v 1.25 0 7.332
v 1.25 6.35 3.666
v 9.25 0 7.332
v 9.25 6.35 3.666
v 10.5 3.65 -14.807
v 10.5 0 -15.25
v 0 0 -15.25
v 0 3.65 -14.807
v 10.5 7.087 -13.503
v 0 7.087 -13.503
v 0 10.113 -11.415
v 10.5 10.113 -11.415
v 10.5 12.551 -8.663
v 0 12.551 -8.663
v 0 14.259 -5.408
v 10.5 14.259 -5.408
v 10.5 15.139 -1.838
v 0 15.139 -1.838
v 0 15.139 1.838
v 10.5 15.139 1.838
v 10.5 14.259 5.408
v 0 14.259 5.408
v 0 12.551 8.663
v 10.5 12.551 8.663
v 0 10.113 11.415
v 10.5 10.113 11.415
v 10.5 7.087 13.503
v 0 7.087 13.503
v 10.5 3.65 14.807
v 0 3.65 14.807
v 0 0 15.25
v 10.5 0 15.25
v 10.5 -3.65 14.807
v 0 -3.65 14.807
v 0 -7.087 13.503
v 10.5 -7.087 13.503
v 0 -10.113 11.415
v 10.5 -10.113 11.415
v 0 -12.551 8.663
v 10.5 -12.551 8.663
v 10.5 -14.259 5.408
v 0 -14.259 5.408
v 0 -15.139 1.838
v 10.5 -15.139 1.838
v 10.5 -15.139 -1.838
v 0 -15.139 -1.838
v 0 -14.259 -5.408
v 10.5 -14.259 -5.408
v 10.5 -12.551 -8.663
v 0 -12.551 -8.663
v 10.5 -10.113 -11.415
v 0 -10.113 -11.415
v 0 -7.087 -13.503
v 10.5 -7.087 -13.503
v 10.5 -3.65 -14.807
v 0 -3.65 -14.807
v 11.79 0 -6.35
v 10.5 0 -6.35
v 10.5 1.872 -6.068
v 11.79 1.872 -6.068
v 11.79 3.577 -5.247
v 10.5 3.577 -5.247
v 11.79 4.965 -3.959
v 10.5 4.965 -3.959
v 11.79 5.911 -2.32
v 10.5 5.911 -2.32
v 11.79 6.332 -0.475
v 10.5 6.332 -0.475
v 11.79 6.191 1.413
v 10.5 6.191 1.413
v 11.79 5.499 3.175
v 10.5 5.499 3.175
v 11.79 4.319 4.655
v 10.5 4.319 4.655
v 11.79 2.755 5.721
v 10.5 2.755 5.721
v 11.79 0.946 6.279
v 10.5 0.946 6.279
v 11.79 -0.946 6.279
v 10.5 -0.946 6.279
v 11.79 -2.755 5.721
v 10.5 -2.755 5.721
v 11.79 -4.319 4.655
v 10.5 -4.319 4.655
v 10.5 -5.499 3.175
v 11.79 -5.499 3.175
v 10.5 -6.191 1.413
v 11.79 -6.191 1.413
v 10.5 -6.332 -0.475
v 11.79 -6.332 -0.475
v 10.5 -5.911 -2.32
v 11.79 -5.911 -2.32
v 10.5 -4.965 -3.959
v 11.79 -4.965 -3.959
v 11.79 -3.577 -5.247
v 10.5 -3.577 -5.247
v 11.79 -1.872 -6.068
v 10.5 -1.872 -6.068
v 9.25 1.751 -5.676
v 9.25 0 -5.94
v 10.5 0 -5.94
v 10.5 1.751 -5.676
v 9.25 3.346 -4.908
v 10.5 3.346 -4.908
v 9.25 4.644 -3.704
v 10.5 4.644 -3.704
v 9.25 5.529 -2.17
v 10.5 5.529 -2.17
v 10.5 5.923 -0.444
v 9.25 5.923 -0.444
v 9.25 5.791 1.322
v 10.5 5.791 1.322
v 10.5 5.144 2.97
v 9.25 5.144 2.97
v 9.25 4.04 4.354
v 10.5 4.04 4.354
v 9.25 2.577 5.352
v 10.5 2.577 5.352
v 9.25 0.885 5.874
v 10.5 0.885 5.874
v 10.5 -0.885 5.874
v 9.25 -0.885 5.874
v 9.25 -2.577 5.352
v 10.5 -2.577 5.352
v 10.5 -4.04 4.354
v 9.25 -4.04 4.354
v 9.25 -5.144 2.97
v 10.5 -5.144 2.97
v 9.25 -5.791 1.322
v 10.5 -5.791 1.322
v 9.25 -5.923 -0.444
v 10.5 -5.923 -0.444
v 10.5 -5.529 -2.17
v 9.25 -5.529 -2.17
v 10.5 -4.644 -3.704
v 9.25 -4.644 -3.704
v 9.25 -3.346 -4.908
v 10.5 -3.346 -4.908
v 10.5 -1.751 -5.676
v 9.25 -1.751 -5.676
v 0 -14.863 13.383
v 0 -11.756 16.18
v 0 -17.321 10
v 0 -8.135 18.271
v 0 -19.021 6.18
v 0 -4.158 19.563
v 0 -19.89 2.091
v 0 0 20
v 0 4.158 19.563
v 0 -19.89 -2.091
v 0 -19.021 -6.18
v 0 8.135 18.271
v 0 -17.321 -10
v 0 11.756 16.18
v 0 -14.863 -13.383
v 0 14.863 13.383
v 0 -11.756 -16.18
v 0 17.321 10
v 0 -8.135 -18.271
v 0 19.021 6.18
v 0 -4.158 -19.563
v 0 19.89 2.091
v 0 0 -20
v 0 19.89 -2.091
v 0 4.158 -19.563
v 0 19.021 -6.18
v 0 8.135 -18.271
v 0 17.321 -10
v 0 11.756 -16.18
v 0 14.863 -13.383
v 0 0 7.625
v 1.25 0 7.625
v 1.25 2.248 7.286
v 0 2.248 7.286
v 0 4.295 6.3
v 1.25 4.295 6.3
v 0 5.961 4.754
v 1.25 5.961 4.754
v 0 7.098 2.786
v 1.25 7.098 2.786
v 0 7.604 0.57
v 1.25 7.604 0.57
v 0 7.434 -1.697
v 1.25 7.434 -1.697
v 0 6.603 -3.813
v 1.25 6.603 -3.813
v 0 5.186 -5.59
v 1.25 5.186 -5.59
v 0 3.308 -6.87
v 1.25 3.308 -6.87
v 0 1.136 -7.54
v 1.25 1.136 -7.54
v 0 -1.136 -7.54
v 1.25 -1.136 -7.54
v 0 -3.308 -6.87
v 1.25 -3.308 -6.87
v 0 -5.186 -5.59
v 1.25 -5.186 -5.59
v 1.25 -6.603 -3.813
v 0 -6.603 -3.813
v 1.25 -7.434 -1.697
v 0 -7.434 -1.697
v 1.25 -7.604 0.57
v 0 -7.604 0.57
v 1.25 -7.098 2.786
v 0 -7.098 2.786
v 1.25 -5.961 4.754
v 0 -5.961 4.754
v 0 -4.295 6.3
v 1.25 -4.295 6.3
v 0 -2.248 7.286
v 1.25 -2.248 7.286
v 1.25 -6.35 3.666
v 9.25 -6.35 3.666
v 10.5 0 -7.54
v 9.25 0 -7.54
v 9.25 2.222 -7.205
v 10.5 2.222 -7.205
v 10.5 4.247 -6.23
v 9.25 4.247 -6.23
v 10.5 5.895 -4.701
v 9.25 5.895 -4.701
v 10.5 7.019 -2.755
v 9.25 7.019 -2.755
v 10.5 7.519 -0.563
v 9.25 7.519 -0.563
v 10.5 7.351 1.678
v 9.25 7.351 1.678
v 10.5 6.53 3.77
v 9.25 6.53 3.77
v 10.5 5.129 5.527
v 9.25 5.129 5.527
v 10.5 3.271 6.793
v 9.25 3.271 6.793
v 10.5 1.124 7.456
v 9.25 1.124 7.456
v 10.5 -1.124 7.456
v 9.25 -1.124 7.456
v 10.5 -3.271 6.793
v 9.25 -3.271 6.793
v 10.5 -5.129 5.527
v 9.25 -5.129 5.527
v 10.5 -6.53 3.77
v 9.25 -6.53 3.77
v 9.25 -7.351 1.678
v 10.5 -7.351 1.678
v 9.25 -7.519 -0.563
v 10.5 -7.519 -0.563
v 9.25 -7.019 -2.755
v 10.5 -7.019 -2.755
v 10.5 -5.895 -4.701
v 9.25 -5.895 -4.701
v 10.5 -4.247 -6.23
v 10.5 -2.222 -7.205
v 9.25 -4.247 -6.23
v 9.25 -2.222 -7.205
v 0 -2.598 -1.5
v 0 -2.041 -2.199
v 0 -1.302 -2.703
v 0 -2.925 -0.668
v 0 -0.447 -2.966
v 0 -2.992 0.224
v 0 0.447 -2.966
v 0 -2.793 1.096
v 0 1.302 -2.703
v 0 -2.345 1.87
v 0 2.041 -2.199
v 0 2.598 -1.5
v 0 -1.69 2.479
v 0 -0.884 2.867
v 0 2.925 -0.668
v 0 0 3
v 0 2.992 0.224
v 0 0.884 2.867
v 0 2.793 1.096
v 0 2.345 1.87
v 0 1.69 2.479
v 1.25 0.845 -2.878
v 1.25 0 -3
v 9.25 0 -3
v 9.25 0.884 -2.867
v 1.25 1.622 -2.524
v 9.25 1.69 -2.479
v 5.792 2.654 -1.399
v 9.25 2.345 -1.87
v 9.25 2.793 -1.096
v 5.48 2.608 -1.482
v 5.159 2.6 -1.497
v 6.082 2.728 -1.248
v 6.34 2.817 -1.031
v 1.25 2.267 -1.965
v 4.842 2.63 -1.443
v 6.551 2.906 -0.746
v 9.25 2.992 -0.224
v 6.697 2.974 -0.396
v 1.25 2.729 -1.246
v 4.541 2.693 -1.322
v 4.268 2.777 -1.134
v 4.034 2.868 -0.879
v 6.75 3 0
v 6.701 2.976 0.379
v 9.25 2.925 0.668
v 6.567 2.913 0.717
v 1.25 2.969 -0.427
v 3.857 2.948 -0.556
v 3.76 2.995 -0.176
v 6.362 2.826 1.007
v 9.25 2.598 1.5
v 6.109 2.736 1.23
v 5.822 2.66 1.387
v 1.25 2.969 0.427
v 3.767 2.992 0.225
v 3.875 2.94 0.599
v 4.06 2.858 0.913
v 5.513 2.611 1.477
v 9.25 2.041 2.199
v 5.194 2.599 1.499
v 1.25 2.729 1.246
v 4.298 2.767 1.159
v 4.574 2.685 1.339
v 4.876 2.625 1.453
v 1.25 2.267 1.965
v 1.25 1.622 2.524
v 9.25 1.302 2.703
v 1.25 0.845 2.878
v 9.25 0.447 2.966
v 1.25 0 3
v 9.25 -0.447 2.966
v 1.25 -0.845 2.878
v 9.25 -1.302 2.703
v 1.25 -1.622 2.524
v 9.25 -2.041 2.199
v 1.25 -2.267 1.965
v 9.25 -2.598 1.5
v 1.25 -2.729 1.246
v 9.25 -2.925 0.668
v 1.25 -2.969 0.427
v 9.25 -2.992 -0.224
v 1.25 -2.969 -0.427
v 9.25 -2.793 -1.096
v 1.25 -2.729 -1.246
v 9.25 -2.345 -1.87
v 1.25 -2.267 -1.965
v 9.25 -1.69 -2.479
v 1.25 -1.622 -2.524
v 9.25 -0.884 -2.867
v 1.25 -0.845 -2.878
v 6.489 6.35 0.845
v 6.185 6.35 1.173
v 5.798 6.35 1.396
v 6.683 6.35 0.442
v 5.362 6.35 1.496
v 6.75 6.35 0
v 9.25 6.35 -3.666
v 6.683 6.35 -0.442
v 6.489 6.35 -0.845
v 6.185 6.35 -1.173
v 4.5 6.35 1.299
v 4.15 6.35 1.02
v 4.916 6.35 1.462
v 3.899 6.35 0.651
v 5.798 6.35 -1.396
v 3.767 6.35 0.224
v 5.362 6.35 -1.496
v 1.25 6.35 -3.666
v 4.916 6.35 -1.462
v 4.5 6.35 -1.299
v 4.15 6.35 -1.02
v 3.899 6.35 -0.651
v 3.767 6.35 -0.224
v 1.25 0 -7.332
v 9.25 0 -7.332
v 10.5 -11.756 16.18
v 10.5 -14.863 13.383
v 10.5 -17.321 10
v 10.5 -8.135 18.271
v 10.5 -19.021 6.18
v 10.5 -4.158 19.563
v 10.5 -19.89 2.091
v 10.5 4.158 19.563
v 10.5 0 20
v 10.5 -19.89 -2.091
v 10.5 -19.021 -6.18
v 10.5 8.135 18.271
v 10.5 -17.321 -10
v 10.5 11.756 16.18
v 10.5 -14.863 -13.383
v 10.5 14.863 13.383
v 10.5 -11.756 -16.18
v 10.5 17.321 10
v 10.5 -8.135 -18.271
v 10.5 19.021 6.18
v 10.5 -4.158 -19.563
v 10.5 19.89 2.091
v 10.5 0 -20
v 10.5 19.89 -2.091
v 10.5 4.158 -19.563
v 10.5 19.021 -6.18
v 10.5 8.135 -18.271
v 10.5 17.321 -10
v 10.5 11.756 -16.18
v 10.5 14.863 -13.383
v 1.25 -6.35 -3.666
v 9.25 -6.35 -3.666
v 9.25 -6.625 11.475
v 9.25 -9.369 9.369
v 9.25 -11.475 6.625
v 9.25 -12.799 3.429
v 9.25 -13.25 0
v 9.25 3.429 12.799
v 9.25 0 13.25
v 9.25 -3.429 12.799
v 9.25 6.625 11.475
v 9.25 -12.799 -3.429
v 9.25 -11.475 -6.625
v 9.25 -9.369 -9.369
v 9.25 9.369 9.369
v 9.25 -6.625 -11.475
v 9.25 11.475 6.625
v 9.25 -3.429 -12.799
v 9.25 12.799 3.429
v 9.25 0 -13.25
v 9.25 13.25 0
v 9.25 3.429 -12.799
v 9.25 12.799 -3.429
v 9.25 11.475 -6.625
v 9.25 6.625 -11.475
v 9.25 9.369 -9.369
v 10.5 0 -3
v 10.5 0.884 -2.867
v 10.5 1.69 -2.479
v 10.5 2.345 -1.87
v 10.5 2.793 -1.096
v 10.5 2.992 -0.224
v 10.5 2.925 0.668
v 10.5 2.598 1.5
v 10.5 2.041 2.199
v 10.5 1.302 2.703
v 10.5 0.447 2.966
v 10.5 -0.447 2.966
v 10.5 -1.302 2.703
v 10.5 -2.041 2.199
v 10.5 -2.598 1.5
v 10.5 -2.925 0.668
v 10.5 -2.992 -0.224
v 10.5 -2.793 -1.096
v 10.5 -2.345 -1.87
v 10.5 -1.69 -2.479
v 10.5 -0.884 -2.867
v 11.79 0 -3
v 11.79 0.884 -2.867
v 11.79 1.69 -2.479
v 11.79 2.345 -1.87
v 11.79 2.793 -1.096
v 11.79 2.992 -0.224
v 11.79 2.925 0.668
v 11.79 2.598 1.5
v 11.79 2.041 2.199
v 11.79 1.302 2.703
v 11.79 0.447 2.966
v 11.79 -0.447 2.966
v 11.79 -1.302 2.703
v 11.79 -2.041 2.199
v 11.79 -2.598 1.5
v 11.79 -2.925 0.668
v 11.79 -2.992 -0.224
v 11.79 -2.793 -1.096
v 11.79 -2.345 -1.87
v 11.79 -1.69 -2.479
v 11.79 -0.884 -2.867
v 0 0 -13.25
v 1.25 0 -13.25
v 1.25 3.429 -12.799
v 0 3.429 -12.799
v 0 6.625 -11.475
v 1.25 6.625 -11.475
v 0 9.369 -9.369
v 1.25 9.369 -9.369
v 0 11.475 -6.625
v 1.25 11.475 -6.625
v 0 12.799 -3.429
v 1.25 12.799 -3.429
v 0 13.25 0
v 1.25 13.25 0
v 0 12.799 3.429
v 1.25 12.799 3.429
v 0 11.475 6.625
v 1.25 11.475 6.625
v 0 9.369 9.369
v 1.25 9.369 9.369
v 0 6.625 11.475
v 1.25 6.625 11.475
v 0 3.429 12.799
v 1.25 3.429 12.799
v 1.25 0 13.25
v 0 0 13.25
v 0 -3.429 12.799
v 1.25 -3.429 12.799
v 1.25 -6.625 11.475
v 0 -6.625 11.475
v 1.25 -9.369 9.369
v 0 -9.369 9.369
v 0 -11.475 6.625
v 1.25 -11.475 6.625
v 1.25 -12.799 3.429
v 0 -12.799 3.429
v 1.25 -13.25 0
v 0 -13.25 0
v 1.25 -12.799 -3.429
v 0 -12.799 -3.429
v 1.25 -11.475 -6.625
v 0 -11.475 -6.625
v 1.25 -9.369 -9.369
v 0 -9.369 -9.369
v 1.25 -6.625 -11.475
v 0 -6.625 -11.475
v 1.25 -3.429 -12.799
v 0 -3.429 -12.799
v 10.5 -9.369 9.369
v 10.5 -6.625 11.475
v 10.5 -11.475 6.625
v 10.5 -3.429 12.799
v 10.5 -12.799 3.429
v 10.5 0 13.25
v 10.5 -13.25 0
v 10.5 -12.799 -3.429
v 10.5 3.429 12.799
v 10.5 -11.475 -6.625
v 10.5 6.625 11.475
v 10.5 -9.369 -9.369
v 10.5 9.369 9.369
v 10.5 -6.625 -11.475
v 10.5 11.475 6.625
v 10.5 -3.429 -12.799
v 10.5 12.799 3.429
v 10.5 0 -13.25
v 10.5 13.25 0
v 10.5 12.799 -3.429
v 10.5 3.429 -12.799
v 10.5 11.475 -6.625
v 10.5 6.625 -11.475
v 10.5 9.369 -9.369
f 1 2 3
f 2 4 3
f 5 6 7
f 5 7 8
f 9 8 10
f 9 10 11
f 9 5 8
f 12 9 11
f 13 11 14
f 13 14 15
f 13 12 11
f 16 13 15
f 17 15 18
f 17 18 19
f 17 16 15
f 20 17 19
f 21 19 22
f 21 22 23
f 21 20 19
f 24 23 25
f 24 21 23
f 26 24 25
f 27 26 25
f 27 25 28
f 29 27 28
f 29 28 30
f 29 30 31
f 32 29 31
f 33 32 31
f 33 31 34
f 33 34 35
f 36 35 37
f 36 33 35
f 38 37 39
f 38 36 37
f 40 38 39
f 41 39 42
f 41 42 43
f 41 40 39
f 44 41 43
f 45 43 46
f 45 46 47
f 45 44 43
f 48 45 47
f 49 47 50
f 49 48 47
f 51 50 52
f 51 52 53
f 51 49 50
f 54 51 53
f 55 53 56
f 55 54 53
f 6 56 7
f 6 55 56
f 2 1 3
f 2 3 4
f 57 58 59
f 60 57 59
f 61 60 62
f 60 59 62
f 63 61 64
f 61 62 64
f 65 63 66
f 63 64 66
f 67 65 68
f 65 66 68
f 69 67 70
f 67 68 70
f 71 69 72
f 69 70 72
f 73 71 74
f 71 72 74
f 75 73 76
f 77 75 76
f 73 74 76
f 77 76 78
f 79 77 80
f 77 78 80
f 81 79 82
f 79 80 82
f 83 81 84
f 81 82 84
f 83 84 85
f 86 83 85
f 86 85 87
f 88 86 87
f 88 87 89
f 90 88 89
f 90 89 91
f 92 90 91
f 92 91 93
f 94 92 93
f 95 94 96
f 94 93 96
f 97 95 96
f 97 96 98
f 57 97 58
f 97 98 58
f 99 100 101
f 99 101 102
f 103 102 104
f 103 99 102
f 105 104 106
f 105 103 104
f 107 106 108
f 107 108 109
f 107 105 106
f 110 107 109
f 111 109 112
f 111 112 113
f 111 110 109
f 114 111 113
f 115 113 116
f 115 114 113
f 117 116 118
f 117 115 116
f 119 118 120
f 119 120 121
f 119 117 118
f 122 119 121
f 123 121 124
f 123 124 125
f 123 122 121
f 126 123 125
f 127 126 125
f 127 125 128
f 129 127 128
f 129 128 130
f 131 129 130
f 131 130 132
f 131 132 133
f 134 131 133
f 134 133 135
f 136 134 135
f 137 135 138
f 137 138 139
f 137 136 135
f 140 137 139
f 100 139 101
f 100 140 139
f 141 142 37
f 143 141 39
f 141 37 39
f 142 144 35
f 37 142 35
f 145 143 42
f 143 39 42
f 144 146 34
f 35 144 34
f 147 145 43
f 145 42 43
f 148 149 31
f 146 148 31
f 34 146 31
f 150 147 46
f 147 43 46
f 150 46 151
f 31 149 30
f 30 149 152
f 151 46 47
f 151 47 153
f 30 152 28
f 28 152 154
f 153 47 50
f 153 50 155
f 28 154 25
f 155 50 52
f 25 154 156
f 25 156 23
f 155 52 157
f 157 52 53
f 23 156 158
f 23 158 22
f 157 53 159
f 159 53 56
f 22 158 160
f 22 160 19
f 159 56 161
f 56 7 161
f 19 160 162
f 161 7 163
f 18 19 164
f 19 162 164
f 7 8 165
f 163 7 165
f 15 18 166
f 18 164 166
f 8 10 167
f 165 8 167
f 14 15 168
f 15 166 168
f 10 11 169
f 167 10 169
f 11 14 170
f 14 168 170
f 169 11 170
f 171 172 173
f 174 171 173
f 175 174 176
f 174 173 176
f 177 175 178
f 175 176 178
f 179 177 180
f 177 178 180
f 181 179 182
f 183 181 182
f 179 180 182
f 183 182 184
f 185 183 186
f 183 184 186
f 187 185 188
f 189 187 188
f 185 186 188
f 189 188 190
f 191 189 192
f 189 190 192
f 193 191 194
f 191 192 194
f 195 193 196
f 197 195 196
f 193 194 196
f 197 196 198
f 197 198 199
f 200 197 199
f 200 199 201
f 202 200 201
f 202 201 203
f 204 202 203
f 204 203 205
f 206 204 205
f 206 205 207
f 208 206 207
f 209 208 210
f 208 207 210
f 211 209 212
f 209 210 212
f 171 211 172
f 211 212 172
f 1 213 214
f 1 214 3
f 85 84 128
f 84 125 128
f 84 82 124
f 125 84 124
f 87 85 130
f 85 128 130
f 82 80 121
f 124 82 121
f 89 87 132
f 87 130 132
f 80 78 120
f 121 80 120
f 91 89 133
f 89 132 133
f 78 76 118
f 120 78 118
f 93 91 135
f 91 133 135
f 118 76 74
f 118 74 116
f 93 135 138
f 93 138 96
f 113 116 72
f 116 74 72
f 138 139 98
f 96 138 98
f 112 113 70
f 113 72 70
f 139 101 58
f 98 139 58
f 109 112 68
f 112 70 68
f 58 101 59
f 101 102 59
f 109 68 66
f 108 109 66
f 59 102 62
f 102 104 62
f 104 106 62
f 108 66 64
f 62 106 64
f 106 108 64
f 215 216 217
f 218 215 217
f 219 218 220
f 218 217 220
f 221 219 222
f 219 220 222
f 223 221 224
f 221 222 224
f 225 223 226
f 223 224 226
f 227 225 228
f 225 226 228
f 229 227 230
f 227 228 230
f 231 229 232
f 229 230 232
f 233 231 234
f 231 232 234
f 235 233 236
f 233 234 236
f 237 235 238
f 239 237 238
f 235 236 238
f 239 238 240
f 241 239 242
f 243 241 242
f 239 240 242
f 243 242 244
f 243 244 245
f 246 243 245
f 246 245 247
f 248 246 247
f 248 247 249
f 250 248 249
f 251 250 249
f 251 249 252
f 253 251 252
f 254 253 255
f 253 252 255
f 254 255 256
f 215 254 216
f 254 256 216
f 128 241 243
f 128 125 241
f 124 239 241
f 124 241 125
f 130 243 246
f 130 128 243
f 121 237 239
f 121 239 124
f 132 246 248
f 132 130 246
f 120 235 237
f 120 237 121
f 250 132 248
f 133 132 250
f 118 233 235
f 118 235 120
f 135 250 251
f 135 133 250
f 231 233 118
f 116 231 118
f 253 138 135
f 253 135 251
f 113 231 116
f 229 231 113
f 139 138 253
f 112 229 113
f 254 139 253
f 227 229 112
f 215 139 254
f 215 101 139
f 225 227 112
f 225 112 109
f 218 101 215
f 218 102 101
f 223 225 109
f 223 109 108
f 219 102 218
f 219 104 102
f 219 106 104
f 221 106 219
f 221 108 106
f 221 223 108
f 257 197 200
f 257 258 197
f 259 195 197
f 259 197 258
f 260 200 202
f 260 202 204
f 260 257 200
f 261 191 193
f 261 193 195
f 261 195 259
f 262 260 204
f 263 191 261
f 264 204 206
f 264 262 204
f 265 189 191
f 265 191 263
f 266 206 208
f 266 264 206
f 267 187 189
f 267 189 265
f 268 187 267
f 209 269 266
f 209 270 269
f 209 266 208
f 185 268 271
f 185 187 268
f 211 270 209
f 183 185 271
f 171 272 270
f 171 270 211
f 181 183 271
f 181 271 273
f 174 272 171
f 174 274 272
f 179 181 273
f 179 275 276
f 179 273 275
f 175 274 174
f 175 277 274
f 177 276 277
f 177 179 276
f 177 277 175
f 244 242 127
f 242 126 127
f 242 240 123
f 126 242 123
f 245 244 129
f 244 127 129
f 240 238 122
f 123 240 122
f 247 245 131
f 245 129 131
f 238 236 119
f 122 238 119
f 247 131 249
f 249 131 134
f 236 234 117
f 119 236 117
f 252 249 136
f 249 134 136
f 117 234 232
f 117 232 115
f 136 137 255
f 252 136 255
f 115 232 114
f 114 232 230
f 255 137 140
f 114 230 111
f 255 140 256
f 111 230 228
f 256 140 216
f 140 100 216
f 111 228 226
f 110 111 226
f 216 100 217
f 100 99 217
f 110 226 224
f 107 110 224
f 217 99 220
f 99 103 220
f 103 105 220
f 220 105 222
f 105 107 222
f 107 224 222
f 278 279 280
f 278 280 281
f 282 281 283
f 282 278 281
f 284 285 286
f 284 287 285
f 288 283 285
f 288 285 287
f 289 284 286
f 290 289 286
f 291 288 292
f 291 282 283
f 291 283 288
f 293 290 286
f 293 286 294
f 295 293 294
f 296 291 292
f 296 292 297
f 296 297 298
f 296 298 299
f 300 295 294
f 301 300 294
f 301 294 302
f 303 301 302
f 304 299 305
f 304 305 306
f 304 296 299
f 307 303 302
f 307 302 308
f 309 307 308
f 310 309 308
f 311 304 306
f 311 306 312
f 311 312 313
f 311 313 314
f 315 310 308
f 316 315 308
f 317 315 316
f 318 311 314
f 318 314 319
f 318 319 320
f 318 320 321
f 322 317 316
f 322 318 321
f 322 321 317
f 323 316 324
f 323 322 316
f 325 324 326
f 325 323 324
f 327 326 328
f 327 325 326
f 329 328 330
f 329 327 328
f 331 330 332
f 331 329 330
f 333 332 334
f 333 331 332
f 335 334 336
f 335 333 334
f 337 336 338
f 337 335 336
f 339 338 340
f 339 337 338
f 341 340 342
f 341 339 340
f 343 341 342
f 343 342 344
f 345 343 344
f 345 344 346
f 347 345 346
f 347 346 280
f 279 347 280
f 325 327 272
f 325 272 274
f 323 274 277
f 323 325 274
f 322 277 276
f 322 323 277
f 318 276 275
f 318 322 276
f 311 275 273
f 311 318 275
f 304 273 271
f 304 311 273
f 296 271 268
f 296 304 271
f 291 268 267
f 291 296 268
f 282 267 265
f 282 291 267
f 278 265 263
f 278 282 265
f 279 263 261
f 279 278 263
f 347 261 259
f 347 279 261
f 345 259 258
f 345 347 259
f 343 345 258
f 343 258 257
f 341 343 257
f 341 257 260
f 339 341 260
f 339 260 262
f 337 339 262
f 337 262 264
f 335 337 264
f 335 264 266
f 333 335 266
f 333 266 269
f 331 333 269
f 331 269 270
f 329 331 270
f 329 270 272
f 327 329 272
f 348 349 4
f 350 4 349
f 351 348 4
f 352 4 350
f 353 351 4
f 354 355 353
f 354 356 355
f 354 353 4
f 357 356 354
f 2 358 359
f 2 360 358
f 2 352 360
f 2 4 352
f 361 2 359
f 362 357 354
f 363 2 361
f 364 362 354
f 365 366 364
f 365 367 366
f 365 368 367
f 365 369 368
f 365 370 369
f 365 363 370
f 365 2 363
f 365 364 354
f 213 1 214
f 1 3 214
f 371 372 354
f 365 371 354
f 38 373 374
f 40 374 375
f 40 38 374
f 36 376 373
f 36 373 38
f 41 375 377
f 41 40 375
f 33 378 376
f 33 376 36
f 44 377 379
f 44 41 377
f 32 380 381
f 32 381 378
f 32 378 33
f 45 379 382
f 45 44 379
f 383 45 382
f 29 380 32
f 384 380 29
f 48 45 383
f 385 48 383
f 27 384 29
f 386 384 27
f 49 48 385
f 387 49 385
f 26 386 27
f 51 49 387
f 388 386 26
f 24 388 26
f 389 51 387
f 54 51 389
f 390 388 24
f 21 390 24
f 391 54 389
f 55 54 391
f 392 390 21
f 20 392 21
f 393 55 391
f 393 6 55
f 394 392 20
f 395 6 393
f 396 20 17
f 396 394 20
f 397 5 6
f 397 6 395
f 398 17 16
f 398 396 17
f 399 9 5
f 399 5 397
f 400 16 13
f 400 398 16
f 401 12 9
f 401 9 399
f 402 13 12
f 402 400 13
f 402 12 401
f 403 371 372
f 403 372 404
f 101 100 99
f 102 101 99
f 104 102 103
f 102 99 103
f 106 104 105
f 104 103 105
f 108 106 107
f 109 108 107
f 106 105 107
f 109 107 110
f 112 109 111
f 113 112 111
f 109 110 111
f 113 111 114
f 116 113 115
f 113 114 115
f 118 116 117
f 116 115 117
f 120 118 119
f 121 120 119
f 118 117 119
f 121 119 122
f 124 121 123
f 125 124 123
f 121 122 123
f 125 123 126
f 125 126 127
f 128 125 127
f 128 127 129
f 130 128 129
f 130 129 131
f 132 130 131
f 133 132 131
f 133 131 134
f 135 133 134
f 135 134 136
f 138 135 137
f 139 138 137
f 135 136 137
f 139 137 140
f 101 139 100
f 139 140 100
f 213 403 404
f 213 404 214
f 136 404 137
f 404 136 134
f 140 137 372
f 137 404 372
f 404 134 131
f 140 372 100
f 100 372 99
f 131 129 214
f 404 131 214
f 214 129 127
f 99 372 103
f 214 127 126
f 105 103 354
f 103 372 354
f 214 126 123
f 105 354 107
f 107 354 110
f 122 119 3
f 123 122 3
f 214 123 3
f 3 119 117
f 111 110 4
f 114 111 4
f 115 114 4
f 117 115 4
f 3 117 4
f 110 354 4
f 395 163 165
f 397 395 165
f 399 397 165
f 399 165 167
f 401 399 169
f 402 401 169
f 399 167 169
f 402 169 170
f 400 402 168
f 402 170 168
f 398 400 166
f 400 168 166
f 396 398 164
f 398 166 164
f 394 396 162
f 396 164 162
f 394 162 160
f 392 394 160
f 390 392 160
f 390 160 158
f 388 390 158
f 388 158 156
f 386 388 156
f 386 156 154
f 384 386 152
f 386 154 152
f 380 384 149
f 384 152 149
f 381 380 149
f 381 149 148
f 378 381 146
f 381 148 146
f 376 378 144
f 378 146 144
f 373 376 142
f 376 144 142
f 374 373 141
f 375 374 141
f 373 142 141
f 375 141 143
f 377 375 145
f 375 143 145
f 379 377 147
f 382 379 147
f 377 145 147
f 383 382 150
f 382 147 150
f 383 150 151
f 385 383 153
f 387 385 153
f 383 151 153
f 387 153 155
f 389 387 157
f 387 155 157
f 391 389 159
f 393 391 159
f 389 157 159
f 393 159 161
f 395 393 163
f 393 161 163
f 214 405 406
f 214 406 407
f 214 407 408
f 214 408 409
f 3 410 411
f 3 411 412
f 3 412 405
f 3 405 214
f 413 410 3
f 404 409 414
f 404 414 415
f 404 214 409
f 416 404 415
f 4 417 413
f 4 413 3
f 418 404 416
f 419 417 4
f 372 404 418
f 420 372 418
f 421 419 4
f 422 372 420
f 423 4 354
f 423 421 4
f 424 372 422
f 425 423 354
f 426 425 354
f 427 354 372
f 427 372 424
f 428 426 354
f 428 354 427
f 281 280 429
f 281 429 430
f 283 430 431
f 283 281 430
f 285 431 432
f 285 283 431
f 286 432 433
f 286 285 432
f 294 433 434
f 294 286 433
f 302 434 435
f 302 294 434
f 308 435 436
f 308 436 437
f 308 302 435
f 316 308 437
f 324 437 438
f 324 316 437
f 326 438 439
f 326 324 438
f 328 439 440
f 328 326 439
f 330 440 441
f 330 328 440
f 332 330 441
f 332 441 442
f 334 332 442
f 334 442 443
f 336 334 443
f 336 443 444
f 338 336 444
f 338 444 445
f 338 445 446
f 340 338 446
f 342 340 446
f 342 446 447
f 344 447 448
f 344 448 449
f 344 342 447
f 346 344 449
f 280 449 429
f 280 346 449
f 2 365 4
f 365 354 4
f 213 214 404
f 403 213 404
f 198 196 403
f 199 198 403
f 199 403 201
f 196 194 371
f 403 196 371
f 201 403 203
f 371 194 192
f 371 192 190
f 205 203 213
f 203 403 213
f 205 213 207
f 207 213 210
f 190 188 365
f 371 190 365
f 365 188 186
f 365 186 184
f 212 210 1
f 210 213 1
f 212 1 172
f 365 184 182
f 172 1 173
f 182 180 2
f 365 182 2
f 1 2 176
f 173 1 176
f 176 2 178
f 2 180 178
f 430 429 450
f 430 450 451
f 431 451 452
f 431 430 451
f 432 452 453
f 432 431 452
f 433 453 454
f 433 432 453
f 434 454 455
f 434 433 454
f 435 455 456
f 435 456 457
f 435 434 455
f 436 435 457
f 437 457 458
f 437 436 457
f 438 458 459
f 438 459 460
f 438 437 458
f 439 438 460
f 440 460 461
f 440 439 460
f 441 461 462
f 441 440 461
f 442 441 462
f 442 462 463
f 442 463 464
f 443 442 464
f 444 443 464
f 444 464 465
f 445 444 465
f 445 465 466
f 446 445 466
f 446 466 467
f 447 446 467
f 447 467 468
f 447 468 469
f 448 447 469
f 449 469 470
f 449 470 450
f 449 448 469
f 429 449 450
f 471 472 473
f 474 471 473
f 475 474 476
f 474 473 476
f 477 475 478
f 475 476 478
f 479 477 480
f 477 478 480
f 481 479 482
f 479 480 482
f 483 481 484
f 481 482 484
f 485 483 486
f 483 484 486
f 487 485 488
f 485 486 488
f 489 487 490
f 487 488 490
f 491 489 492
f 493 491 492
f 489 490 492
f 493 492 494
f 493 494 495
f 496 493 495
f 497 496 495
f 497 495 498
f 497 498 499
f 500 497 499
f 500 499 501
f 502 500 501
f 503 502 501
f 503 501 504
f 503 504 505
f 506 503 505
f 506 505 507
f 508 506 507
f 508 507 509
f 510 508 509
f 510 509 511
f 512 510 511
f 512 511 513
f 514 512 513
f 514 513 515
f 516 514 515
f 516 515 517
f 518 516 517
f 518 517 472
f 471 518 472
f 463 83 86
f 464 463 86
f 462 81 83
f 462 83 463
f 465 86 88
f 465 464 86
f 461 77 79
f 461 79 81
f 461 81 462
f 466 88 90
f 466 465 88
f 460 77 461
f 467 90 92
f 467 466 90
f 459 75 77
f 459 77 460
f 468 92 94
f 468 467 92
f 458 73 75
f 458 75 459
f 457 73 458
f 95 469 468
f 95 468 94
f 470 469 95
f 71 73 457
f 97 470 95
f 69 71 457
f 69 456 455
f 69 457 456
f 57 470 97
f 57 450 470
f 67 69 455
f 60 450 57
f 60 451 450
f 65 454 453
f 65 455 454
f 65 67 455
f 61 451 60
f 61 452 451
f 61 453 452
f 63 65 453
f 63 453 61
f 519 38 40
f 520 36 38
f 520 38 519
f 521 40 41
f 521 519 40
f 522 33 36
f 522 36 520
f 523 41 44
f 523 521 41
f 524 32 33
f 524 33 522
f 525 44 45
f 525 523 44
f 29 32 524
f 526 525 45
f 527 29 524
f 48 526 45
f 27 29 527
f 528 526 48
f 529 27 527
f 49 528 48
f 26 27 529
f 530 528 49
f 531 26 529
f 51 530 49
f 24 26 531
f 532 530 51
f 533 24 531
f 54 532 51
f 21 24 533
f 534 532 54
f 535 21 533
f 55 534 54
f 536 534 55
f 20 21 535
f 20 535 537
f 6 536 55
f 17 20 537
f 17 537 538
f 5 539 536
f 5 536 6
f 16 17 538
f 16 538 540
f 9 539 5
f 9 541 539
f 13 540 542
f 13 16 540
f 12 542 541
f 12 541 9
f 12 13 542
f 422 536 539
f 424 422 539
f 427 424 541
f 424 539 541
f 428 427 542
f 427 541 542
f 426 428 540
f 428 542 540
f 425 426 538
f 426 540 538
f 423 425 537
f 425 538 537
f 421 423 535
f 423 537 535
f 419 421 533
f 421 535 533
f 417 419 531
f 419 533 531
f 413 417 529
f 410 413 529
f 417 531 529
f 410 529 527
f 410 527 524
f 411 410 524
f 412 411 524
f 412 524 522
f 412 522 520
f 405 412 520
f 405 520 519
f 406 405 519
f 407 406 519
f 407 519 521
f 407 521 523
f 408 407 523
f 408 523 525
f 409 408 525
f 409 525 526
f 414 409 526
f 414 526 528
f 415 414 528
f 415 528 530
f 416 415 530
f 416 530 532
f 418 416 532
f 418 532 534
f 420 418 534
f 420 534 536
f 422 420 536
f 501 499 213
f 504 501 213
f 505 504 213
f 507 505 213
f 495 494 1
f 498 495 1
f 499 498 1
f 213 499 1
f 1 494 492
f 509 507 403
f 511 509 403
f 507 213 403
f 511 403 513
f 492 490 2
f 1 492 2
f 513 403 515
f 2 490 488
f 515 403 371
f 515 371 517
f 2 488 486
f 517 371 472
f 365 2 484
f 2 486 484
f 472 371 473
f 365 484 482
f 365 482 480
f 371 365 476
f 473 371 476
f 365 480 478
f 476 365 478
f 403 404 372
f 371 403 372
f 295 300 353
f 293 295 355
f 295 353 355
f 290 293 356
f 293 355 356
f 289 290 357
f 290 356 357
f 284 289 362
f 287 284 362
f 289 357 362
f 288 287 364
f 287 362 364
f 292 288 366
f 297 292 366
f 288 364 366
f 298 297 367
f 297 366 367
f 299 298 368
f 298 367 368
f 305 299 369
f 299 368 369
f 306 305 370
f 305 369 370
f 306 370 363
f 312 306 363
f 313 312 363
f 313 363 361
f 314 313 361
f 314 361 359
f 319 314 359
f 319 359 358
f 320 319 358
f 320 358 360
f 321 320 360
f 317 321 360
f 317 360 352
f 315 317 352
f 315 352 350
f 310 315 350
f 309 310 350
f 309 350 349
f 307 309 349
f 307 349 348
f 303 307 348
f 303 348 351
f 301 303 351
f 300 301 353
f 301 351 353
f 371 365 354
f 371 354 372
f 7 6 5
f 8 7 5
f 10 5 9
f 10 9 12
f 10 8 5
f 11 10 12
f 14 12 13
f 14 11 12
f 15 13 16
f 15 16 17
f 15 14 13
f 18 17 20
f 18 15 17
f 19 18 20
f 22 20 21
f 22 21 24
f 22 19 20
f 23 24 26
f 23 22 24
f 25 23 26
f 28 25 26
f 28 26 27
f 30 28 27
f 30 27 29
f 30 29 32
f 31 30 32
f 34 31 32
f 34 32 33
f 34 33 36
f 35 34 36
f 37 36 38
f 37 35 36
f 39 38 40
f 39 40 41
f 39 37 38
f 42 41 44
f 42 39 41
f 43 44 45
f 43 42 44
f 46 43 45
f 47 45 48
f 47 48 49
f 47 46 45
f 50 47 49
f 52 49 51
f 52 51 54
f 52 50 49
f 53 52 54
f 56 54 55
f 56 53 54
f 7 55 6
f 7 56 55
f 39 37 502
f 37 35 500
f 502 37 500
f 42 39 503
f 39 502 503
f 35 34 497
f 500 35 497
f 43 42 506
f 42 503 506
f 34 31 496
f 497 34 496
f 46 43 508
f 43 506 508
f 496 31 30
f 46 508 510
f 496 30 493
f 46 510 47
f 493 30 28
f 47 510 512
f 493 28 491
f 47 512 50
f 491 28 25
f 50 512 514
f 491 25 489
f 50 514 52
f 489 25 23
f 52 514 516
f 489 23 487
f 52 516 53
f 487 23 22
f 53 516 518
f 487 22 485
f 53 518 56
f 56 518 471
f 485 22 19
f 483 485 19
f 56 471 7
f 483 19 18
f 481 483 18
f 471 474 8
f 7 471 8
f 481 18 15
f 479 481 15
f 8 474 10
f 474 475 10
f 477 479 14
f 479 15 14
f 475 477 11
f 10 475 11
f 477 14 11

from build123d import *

# Parameters (mm, degrees)
SKETCH1_R                = 20
SKETCH1_R_2              = 15.25
BOSS_EXTRUDE1_DEPTH      = 10.5
SKETCH2_R                = 15.25
SKETCH2_R_2              = 13.25
BOSS_EXTRUDE2_DEPTH      = 10.5
SKETCH3_R                = 13.25
BOSS_EXTRUDE3_DEPTH      = 4
BOSS_EXTRUDE3_DEPTH_BACK = 4
SKETCH4_R                = 7.625
SKETCH4_R_2              = 3
BOSS_EXTRUDE4_DEPTH      = 1.25
SKETCH5_R                = 3
BOSS_EXTRUDE5_DEPTH      = 8
SKETCH6_R                = 5.94
SKETCH6_R_2              = 3
BOSS_EXTRUDE6_DEPTH      = 1.25
SKETCH7_R                = 6.35
SKETCH7_R_2              = 3
BOSS_EXTRUDE7_DEPTH      = 1.29
SKETCH8_R                = 1.5
CUT_EXTRUDE1_DEPTH       = 6.35
SKETCH9_R                = 7.54
SKETCH9_R_2              = 5.94
BOSS_EXTRUDE8_DEPTH      = 1.25


with BuildPart() as part:
    # Sketch1 → Boss-Extrude1 (new body)
    with BuildSketch(Plane(origin=(0, 0, 0), x_dir=(0, 0, -1), z_dir=(1, 0, 0))):
        Circle(SKETCH1_R)
        Circle(SKETCH1_R_2, mode=Mode.SUBTRACT)
    extrude(amount=BOSS_EXTRUDE1_DEPTH)


with BuildPart() as body_2:
    # Sketch2 → Boss-Extrude2 (new body)
    with BuildSketch(Plane(origin=(10.5, 0, 0), x_dir=(0, 0, -1), z_dir=(1, 0, 0))):
        Circle(SKETCH2_R)
        Circle(SKETCH2_R_2, mode=Mode.SUBTRACT)
    extrude(amount=-BOSS_EXTRUDE2_DEPTH)

    # Sketch3 → Boss-Extrude3 (add, two sides)
    with BuildSketch(Plane(origin=(5.25, 0, 0), x_dir=(0, 0, -1), z_dir=(1, 0, 0))) as boss_extrude3_sk:
        Circle(SKETCH3_R)
        Polygon((7.332348419, 0), (3.666174209, 6.35), (-3.666174209, 6.35), (-7.332348419, 0), (-3.666174209, -6.35), (3.666174209, -6.35), align=None, mode=Mode.SUBTRACT)
    extrude(amount=BOSS_EXTRUDE3_DEPTH)
    extrude(boss_extrude3_sk.sketch, amount=-BOSS_EXTRUDE3_DEPTH_BACK)


with BuildPart() as body_3:
    # Sketch4 → Boss-Extrude4 (new body)
    with BuildSketch(Plane.ZY.offset(-1.25)):
        Circle(SKETCH4_R)
        Circle(SKETCH4_R_2, mode=Mode.SUBTRACT)
    extrude(amount=BOSS_EXTRUDE4_DEPTH)

    # Sketch5 → Boss-Extrude5 (add)
    with BuildSketch(Plane(origin=(1.25, 0, 0), x_dir=(0, 0, -1), z_dir=(1, 0, 0))):
        Polygon((-7.332348419, 0), (-3.666174209, 6.35), (3.666174209, 6.35), (7.332348419, 0), (3.666174209, -6.35), (-3.666174209, -6.35), align=None)
        Circle(SKETCH5_R, mode=Mode.SUBTRACT)
    extrude(amount=BOSS_EXTRUDE5_DEPTH)

    # Sketch6 → Boss-Extrude6 (add)
    with BuildSketch(Plane(origin=(9.25, 0, 0), x_dir=(0, 0, -1), z_dir=(1, 0, 0))):
        Circle(SKETCH6_R)
        Circle(SKETCH6_R_2, mode=Mode.SUBTRACT)
    extrude(amount=BOSS_EXTRUDE6_DEPTH)

    # Sketch7 → Boss-Extrude7 (add)
    with BuildSketch(Plane(origin=(10.5, 0, 0), x_dir=(0, 0, -1), z_dir=(1, 0, 0))):
        Circle(SKETCH7_R)
        Circle(SKETCH7_R_2, mode=Mode.SUBTRACT)
    extrude(amount=BOSS_EXTRUDE7_DEPTH)

    # Sketch8 → Cut-Extrude1 (cut)
    with BuildSketch(Plane(origin=(0, 6.35, 0), x_dir=(1, 0, 0), z_dir=(0, 1, 0))):
        with Locations((5.25, 0)):
            Circle(SKETCH8_R)
    extrude(amount=-CUT_EXTRUDE1_DEPTH, mode=Mode.SUBTRACT)


with BuildPart() as body_4:
    # Sketch9 → Boss-Extrude8 (new body)
    with BuildSketch(Plane(origin=(9.25, 0, 0), x_dir=(0, 0, -1), z_dir=(1, 0, 0))):
        Circle(SKETCH9_R)
        Circle(SKETCH9_R_2, mode=Mode.SUBTRACT)
    extrude(amount=BOSS_EXTRUDE8_DEPTH)


solid = Compound([part.part, body_2.part, body_3.part, body_4.part])
